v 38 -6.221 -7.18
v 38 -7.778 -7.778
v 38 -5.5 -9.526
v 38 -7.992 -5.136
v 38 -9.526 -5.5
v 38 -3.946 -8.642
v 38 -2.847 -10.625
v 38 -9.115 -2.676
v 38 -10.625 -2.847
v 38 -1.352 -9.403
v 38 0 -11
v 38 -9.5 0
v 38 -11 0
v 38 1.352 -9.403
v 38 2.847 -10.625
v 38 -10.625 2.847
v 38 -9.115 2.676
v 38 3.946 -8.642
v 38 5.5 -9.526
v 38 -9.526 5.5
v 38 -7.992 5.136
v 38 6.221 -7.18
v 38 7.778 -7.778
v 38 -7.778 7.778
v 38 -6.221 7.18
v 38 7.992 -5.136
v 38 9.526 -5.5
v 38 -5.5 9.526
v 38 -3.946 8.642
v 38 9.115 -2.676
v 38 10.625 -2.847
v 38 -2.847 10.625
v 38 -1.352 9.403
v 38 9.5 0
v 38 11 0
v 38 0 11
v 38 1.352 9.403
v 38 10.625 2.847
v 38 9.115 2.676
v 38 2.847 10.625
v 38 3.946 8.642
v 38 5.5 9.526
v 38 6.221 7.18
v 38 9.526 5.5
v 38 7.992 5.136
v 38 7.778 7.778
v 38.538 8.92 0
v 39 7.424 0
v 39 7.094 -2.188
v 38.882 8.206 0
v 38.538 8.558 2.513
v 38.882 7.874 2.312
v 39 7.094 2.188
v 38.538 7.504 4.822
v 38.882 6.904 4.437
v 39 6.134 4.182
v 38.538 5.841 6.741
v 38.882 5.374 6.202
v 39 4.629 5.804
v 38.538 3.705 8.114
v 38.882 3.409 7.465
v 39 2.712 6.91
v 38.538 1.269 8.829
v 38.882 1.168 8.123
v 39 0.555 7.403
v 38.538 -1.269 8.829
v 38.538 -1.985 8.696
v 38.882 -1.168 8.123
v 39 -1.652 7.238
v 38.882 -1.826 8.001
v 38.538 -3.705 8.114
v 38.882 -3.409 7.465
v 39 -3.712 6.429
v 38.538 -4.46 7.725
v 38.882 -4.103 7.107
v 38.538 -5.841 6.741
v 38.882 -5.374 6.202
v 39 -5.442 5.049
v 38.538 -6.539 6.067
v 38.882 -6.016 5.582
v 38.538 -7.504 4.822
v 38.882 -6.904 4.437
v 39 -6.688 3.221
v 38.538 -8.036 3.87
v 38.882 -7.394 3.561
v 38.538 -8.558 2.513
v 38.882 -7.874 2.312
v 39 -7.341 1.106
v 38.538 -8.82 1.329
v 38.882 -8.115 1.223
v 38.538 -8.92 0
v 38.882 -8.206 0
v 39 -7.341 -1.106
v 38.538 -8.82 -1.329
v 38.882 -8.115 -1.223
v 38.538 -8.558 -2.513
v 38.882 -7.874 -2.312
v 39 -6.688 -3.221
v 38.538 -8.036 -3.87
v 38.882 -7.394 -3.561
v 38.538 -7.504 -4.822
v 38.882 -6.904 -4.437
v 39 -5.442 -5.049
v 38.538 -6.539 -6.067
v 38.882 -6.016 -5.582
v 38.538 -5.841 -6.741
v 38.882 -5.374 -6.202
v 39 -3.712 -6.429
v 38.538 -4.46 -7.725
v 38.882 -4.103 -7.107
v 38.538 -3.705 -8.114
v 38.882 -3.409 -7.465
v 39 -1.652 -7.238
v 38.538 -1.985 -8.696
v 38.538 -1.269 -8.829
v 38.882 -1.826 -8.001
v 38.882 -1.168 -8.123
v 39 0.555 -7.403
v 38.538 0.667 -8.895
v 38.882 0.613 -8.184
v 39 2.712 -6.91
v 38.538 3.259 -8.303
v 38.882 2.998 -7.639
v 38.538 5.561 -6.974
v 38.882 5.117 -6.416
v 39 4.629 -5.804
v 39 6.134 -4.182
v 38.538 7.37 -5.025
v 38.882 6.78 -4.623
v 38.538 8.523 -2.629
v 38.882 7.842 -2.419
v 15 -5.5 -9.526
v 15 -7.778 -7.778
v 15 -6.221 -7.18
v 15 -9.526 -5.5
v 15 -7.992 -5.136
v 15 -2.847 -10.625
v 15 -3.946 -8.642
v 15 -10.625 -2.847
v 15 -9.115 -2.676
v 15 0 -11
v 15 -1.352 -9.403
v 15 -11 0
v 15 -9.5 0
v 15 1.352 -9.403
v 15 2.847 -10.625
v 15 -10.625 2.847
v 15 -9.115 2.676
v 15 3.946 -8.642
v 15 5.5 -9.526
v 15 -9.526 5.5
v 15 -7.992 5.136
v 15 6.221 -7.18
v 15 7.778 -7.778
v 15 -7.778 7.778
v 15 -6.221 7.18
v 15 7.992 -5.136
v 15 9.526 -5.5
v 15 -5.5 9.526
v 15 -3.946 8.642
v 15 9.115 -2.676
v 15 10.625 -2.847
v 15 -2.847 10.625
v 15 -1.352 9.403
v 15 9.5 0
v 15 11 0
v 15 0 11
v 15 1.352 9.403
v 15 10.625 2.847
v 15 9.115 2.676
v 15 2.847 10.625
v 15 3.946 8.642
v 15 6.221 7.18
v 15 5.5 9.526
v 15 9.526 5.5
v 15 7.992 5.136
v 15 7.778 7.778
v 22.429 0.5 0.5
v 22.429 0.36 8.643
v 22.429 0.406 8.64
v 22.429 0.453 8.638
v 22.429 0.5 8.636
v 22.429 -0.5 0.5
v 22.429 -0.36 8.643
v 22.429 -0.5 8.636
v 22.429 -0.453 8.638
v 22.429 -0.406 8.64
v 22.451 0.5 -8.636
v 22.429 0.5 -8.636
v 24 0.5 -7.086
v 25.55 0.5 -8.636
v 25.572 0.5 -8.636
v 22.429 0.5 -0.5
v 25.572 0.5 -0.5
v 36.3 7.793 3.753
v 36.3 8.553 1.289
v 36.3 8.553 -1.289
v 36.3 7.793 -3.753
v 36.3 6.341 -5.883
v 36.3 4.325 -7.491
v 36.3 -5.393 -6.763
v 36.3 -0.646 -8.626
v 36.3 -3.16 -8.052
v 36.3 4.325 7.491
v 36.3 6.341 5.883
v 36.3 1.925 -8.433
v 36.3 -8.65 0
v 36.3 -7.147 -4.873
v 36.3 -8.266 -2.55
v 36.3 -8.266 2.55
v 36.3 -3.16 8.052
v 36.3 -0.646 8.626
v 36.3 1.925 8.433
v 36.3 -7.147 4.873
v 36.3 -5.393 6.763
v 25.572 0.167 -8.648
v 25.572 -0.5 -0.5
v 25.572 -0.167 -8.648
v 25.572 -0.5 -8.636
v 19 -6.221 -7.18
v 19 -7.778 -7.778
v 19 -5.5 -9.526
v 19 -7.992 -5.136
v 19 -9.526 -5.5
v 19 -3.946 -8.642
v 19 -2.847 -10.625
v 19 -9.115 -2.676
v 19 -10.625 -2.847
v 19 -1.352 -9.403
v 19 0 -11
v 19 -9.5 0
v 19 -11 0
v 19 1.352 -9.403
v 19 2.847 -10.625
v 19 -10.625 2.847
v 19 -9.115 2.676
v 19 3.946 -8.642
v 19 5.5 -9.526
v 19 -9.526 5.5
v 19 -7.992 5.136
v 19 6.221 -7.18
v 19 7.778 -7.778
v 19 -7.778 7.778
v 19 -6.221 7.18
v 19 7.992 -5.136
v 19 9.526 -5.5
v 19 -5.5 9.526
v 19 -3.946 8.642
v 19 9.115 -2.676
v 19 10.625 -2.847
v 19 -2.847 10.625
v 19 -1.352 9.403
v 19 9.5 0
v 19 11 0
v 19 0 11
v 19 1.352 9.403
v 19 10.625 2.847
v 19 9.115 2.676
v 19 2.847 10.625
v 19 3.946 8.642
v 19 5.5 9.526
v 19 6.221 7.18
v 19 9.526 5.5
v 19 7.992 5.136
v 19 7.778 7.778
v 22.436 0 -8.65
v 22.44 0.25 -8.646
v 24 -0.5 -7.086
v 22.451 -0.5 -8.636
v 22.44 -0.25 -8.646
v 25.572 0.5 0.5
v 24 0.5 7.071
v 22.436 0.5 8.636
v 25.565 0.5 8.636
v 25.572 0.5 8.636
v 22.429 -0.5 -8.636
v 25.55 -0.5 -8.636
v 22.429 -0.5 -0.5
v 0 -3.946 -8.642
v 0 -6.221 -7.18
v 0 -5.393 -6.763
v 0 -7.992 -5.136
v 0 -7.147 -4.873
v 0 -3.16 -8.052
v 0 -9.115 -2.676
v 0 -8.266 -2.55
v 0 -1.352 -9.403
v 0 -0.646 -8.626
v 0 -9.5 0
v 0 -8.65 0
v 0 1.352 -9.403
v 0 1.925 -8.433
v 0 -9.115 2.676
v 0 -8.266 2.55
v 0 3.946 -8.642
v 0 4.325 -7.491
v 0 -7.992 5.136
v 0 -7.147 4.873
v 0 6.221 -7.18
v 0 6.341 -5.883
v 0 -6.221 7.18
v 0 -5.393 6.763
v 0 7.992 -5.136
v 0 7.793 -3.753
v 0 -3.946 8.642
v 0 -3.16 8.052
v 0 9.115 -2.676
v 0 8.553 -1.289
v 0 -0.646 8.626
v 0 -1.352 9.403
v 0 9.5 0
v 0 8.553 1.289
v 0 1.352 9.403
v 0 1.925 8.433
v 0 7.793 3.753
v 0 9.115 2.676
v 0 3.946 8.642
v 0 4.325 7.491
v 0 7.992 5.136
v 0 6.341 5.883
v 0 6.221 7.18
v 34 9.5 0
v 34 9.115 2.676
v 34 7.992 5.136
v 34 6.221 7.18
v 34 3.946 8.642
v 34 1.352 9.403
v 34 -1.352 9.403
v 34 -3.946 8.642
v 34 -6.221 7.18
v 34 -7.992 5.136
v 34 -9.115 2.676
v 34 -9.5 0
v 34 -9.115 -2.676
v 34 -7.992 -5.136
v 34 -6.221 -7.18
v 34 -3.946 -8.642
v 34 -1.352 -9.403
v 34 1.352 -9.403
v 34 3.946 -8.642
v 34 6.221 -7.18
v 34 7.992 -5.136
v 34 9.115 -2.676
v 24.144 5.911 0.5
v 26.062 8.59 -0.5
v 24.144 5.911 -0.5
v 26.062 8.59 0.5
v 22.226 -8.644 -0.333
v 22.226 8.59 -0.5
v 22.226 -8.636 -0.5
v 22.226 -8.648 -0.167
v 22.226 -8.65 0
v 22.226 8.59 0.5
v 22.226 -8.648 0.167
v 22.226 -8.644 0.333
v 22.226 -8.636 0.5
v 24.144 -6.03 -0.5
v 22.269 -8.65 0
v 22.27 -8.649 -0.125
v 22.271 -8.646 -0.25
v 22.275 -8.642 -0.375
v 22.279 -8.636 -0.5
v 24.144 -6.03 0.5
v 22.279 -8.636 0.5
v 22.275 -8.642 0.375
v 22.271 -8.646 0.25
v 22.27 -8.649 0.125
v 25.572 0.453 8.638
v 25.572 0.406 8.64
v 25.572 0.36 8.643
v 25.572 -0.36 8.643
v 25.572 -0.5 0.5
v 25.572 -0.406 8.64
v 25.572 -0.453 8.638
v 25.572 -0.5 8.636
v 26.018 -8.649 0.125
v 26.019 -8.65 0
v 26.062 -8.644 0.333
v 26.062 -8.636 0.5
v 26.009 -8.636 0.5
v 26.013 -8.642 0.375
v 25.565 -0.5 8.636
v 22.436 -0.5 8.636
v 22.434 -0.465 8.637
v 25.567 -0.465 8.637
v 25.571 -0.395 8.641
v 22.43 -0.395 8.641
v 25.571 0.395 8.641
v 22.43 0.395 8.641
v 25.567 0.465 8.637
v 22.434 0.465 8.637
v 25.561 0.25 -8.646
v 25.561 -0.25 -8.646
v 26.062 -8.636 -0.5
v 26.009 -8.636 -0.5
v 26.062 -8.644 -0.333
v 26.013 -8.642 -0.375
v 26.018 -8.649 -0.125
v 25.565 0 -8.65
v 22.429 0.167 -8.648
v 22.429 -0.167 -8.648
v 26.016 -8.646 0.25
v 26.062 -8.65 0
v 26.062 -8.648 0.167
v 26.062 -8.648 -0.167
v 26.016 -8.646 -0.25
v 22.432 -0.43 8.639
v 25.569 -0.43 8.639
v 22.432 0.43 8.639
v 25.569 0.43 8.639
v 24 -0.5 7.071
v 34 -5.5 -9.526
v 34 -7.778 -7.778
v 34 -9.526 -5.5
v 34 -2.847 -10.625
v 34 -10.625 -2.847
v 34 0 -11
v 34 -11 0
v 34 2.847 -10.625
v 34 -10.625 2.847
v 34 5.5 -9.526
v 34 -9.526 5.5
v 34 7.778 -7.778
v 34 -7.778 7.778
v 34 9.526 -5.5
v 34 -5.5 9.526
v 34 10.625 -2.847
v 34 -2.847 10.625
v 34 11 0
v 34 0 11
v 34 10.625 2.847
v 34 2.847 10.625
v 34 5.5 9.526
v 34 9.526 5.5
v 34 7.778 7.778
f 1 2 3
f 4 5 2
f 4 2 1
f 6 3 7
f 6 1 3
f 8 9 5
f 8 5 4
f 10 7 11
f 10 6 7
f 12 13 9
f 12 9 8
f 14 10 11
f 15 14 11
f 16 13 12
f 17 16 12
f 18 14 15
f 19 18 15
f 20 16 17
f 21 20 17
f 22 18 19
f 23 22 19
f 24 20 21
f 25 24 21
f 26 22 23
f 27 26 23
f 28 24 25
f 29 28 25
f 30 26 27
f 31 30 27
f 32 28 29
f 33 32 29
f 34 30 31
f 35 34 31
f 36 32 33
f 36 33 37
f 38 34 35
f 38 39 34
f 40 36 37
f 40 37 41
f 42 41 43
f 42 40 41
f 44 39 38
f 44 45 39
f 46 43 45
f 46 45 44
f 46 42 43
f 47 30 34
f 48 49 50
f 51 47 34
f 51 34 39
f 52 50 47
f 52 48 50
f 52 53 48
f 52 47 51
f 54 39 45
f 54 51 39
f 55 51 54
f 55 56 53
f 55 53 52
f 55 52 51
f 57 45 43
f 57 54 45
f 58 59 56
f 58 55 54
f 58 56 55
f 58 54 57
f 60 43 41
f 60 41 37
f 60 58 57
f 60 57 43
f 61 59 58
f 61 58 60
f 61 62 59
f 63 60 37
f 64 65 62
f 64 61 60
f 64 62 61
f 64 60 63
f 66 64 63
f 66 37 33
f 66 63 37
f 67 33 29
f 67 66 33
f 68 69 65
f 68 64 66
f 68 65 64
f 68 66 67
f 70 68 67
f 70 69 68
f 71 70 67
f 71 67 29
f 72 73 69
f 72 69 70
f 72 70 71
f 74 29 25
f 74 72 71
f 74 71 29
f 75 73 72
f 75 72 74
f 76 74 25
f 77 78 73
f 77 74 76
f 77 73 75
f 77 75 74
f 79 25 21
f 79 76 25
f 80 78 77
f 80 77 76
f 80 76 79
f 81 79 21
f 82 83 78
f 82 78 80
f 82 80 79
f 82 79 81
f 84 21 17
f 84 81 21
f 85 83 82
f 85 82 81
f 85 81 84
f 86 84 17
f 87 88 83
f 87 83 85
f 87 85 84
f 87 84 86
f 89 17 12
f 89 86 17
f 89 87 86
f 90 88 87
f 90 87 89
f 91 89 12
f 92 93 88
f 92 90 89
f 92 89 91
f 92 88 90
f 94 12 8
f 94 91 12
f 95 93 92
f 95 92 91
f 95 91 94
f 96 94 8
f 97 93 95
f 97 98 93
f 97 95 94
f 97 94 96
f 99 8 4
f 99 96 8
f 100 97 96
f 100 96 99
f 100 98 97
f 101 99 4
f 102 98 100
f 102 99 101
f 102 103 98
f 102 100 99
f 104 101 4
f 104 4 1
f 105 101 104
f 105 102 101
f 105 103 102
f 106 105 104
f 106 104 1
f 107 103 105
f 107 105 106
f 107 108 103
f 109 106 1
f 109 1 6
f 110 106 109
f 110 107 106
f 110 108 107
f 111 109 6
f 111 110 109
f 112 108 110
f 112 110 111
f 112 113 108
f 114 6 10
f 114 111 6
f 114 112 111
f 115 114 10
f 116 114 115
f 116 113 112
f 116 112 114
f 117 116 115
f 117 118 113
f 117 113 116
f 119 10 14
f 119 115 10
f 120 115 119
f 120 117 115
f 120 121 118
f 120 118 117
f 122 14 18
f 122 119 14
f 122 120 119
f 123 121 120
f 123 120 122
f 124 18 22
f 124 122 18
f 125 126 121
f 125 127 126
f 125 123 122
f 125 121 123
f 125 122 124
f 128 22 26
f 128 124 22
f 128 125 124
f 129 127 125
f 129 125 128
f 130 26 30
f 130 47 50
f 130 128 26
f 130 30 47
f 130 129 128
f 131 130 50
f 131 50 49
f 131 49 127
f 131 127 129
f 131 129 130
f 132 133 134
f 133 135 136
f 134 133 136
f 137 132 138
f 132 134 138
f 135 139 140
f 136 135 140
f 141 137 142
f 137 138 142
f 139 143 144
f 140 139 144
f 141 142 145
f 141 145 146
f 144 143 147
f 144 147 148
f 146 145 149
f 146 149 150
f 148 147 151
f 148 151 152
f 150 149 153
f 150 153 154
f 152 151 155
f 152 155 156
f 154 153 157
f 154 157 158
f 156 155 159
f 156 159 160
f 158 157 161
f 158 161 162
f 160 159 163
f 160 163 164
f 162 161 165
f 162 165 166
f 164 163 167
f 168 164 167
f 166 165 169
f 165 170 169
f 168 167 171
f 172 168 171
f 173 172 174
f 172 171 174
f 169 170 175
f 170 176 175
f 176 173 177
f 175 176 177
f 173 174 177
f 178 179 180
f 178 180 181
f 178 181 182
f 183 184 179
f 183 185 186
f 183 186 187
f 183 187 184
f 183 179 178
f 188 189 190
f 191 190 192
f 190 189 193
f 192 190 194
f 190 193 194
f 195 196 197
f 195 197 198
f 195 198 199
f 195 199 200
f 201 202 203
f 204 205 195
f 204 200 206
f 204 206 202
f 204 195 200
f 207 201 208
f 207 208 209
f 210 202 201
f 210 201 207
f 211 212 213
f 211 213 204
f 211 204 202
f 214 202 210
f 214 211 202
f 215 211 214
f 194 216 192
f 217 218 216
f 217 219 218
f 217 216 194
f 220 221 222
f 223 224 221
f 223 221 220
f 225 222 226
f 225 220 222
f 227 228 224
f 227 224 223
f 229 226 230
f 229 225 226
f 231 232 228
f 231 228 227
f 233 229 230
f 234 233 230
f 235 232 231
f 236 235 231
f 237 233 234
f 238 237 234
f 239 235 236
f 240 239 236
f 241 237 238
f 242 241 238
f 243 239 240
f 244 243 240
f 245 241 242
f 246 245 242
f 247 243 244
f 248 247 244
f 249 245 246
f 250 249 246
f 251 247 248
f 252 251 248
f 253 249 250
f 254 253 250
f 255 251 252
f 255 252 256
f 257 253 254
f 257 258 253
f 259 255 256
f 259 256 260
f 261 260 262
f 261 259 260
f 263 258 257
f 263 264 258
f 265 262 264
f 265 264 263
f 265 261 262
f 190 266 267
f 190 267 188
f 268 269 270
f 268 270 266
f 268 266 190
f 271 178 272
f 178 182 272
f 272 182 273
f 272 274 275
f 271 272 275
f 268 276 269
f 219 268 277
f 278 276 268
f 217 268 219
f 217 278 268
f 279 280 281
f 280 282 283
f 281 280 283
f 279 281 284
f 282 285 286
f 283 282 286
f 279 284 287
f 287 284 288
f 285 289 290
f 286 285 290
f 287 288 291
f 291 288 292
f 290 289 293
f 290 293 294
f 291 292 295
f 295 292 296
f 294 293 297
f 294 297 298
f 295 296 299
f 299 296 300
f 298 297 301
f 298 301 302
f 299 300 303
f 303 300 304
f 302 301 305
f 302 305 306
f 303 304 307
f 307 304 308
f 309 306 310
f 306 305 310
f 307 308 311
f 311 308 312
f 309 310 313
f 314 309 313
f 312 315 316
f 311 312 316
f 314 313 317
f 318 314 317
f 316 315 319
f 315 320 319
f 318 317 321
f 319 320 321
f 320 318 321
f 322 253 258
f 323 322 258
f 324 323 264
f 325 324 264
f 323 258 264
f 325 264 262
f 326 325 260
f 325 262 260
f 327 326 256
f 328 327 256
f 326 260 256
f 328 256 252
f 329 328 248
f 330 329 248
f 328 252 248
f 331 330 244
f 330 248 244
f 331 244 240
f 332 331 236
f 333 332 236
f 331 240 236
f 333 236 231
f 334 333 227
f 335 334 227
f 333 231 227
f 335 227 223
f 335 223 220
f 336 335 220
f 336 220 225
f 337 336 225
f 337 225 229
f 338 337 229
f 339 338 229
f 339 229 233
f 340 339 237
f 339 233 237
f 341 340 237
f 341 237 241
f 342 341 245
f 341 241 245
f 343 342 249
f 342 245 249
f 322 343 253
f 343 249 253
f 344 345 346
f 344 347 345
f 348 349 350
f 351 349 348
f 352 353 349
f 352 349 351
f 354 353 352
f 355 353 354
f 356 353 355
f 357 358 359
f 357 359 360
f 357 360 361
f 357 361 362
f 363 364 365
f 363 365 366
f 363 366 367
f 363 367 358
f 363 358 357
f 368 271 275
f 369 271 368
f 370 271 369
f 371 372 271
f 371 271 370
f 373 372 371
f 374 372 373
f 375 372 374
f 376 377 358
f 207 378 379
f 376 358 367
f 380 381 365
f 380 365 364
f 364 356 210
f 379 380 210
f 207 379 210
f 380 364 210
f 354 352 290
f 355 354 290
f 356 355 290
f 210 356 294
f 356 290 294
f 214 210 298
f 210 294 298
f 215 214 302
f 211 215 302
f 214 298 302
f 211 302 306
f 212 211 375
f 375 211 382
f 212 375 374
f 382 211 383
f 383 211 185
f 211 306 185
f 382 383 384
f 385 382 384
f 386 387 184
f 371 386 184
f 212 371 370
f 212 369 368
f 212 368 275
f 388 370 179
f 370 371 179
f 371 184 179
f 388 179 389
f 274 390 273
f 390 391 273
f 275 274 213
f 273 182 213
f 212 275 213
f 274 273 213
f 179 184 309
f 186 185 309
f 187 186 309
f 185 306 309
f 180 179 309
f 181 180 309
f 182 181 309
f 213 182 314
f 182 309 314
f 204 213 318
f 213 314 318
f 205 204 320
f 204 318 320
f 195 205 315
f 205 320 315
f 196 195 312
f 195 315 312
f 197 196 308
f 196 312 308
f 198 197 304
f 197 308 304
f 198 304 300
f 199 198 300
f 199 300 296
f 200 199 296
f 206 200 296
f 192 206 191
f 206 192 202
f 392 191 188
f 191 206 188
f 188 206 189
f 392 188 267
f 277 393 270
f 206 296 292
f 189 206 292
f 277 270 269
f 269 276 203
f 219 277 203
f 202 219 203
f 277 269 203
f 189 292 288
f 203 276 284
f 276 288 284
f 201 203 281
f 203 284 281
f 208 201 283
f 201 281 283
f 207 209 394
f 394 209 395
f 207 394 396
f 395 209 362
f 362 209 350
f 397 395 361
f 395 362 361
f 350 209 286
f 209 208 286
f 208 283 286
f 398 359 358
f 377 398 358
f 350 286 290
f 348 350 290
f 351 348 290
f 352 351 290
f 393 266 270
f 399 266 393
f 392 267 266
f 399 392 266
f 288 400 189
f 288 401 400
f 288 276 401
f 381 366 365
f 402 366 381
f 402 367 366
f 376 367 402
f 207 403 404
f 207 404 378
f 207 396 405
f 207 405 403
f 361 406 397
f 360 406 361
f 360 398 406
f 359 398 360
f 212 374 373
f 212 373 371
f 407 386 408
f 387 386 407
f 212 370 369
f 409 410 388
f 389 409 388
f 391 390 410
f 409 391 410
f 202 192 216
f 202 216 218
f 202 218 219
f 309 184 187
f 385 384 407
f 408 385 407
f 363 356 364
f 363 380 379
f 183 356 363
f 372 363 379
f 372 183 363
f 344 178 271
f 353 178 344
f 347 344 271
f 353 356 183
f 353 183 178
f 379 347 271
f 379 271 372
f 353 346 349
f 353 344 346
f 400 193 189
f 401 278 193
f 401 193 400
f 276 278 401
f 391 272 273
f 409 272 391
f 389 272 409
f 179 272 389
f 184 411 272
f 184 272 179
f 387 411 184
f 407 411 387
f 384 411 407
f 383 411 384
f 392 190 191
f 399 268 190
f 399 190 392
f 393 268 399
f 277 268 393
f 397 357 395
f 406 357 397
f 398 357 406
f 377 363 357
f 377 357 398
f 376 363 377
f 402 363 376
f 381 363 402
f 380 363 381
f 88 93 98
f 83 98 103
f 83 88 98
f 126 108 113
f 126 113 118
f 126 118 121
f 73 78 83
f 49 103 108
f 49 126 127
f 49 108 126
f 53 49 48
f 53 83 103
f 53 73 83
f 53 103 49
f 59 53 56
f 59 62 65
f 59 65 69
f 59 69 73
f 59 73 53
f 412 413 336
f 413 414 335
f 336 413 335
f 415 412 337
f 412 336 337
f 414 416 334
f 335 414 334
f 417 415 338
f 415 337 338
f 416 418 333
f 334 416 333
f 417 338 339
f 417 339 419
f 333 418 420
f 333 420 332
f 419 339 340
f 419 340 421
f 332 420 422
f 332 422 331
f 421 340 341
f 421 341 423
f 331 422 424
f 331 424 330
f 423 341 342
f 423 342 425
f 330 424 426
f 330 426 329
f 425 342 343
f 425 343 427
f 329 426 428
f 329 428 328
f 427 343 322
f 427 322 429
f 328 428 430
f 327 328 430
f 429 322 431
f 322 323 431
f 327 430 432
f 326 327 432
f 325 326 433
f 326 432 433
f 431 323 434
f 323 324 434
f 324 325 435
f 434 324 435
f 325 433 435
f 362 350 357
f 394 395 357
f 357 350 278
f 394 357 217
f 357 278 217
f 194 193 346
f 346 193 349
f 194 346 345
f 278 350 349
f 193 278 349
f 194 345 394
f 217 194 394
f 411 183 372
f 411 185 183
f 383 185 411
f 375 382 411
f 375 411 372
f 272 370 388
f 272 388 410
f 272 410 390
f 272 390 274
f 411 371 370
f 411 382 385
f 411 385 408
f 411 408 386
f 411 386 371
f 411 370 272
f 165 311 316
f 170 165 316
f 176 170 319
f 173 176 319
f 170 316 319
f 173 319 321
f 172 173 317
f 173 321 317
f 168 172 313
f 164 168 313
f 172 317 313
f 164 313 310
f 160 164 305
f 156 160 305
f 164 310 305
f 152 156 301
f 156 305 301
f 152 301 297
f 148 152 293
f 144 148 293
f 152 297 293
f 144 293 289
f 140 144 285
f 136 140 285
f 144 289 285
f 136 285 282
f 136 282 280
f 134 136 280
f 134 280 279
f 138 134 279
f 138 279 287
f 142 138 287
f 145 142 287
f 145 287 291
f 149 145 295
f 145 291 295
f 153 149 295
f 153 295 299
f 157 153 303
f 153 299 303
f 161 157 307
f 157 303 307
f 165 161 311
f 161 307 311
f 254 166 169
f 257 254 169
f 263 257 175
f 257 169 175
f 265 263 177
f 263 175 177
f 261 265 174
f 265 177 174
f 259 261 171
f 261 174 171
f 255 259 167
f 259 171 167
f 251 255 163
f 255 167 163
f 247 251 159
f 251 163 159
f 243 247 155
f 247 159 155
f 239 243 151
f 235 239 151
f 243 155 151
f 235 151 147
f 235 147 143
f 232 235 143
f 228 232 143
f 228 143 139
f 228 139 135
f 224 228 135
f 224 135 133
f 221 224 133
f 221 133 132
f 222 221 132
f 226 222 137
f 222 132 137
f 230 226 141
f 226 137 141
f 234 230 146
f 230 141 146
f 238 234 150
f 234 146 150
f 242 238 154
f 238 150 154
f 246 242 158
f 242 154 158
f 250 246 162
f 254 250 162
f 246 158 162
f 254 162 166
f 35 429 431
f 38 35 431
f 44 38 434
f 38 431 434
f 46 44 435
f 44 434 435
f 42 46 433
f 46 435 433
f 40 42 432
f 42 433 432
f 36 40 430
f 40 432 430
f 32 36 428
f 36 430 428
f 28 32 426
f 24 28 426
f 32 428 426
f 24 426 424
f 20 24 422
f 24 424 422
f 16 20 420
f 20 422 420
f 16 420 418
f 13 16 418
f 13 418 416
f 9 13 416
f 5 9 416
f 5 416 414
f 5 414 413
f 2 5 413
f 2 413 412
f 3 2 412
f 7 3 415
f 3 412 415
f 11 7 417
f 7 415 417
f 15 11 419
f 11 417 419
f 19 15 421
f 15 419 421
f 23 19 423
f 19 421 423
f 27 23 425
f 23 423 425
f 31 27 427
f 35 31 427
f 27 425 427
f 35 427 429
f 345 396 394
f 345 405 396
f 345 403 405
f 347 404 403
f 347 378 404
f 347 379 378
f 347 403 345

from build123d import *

# Parameters (mm, degrees)
F0_R      = 9.5
F1_DEPTH  = 15
F2_R      = 11
F3_DEPTH  = 4
F4_R      = 9.5
F5_DEPTH  = 15
F6_R      = 11
F7_DEPTH  = 4
F8_R      = 9.5
F9_DEPTH  = 1
F11_R     = 8.65
F12_DEPTH = 36.3
F15_DEPTH = 0.5
F16_DEPTH = 0.5


# Not quite as in the source:
# - a fillet or chamfer that OpenCascade refuses, or shapes differently, is made with other operations: its cross-section is extruded or revolved along the edge and cut away or added


with BuildPart() as f1:
    # F0 (on Right) → F1 (new body)
    with BuildSketch(Plane.YZ):
        Circle(F0_R)
    extrude(amount=F1_DEPTH)

    # F2 (on face) → F3 (join)
    with BuildSketch(Plane.YZ.offset(15)):
        Circle(F2_R)
    extrude(amount=F3_DEPTH)

    # F4 (on face) → F5 (join)
    with BuildSketch(Plane.YZ.offset(19)):
        Circle(F4_R)
    extrude(amount=F5_DEPTH)

    # F6 (on face) → F7 (join)
    with BuildSketch(Plane.YZ.offset(34)):
        Circle(F6_R)
    extrude(amount=F7_DEPTH)

    # F8 (on face) → F9 (join)
    with BuildSketch(Plane.YZ.offset(38)):
        Circle(F8_R)
    extrude(amount=F9_DEPTH)

    # F10: fillet of radius 2.6556349186 on 1 edges, made by hand

    # F10_s1 → F10_t2 (revolve, cut)
    with BuildSketch(Plane.XY):
        with BuildLine():
            ThreePointArc((38, 9.5), (38.7369744021, 8.5759498633), (39, 7.4236402438))
            Line((39, 7.4236402438), (39, 9.5))
            Line((39, 9.5), (38, 9.5))
        make_face()
    revolve(axis=Axis((39, 0, 0), (1, 0, 0)), mode=Mode.SUBTRACT)

    # F11 (on face) → F12 (cut)
    with BuildSketch(Plane(origin=(0, 0, 0), x_dir=(0, -1, 0), z_dir=(-1, 0, 0))):
        Circle(F11_R)
    extrude(amount=-F12_DEPTH, mode=Mode.SUBTRACT)

    # F14 (on Front) → F15 (join, symmetric)
    with BuildSketch(Plane.XZ):
        Polygon((25.5720777049, -8.6574743293), (25.5720777049, 8.6425256707), (24.0004413285, 7.0708892943), (22.4288049522, 8.6425256707), (22.4288049522, -8.6574743293), (24.0004413285, -7.085837953), align=None)
    extrude(amount=F15_DEPTH, both=True)

    # F13 (on Top) → F16 (join, symmetric)
    with BuildSketch(Plane.XY):
        Polygon((24.1439803634, 5.9105833968), (22.2261317603, 8.5902402711), (22.2261317603, -8.7097597289), (24.1439803634, -6.0301028546), (26.0618289666, -8.7097597289), (26.0618289666, 8.5902402711), align=None)
    extrude(amount=F16_DEPTH, both=True)


solid = f1.part
